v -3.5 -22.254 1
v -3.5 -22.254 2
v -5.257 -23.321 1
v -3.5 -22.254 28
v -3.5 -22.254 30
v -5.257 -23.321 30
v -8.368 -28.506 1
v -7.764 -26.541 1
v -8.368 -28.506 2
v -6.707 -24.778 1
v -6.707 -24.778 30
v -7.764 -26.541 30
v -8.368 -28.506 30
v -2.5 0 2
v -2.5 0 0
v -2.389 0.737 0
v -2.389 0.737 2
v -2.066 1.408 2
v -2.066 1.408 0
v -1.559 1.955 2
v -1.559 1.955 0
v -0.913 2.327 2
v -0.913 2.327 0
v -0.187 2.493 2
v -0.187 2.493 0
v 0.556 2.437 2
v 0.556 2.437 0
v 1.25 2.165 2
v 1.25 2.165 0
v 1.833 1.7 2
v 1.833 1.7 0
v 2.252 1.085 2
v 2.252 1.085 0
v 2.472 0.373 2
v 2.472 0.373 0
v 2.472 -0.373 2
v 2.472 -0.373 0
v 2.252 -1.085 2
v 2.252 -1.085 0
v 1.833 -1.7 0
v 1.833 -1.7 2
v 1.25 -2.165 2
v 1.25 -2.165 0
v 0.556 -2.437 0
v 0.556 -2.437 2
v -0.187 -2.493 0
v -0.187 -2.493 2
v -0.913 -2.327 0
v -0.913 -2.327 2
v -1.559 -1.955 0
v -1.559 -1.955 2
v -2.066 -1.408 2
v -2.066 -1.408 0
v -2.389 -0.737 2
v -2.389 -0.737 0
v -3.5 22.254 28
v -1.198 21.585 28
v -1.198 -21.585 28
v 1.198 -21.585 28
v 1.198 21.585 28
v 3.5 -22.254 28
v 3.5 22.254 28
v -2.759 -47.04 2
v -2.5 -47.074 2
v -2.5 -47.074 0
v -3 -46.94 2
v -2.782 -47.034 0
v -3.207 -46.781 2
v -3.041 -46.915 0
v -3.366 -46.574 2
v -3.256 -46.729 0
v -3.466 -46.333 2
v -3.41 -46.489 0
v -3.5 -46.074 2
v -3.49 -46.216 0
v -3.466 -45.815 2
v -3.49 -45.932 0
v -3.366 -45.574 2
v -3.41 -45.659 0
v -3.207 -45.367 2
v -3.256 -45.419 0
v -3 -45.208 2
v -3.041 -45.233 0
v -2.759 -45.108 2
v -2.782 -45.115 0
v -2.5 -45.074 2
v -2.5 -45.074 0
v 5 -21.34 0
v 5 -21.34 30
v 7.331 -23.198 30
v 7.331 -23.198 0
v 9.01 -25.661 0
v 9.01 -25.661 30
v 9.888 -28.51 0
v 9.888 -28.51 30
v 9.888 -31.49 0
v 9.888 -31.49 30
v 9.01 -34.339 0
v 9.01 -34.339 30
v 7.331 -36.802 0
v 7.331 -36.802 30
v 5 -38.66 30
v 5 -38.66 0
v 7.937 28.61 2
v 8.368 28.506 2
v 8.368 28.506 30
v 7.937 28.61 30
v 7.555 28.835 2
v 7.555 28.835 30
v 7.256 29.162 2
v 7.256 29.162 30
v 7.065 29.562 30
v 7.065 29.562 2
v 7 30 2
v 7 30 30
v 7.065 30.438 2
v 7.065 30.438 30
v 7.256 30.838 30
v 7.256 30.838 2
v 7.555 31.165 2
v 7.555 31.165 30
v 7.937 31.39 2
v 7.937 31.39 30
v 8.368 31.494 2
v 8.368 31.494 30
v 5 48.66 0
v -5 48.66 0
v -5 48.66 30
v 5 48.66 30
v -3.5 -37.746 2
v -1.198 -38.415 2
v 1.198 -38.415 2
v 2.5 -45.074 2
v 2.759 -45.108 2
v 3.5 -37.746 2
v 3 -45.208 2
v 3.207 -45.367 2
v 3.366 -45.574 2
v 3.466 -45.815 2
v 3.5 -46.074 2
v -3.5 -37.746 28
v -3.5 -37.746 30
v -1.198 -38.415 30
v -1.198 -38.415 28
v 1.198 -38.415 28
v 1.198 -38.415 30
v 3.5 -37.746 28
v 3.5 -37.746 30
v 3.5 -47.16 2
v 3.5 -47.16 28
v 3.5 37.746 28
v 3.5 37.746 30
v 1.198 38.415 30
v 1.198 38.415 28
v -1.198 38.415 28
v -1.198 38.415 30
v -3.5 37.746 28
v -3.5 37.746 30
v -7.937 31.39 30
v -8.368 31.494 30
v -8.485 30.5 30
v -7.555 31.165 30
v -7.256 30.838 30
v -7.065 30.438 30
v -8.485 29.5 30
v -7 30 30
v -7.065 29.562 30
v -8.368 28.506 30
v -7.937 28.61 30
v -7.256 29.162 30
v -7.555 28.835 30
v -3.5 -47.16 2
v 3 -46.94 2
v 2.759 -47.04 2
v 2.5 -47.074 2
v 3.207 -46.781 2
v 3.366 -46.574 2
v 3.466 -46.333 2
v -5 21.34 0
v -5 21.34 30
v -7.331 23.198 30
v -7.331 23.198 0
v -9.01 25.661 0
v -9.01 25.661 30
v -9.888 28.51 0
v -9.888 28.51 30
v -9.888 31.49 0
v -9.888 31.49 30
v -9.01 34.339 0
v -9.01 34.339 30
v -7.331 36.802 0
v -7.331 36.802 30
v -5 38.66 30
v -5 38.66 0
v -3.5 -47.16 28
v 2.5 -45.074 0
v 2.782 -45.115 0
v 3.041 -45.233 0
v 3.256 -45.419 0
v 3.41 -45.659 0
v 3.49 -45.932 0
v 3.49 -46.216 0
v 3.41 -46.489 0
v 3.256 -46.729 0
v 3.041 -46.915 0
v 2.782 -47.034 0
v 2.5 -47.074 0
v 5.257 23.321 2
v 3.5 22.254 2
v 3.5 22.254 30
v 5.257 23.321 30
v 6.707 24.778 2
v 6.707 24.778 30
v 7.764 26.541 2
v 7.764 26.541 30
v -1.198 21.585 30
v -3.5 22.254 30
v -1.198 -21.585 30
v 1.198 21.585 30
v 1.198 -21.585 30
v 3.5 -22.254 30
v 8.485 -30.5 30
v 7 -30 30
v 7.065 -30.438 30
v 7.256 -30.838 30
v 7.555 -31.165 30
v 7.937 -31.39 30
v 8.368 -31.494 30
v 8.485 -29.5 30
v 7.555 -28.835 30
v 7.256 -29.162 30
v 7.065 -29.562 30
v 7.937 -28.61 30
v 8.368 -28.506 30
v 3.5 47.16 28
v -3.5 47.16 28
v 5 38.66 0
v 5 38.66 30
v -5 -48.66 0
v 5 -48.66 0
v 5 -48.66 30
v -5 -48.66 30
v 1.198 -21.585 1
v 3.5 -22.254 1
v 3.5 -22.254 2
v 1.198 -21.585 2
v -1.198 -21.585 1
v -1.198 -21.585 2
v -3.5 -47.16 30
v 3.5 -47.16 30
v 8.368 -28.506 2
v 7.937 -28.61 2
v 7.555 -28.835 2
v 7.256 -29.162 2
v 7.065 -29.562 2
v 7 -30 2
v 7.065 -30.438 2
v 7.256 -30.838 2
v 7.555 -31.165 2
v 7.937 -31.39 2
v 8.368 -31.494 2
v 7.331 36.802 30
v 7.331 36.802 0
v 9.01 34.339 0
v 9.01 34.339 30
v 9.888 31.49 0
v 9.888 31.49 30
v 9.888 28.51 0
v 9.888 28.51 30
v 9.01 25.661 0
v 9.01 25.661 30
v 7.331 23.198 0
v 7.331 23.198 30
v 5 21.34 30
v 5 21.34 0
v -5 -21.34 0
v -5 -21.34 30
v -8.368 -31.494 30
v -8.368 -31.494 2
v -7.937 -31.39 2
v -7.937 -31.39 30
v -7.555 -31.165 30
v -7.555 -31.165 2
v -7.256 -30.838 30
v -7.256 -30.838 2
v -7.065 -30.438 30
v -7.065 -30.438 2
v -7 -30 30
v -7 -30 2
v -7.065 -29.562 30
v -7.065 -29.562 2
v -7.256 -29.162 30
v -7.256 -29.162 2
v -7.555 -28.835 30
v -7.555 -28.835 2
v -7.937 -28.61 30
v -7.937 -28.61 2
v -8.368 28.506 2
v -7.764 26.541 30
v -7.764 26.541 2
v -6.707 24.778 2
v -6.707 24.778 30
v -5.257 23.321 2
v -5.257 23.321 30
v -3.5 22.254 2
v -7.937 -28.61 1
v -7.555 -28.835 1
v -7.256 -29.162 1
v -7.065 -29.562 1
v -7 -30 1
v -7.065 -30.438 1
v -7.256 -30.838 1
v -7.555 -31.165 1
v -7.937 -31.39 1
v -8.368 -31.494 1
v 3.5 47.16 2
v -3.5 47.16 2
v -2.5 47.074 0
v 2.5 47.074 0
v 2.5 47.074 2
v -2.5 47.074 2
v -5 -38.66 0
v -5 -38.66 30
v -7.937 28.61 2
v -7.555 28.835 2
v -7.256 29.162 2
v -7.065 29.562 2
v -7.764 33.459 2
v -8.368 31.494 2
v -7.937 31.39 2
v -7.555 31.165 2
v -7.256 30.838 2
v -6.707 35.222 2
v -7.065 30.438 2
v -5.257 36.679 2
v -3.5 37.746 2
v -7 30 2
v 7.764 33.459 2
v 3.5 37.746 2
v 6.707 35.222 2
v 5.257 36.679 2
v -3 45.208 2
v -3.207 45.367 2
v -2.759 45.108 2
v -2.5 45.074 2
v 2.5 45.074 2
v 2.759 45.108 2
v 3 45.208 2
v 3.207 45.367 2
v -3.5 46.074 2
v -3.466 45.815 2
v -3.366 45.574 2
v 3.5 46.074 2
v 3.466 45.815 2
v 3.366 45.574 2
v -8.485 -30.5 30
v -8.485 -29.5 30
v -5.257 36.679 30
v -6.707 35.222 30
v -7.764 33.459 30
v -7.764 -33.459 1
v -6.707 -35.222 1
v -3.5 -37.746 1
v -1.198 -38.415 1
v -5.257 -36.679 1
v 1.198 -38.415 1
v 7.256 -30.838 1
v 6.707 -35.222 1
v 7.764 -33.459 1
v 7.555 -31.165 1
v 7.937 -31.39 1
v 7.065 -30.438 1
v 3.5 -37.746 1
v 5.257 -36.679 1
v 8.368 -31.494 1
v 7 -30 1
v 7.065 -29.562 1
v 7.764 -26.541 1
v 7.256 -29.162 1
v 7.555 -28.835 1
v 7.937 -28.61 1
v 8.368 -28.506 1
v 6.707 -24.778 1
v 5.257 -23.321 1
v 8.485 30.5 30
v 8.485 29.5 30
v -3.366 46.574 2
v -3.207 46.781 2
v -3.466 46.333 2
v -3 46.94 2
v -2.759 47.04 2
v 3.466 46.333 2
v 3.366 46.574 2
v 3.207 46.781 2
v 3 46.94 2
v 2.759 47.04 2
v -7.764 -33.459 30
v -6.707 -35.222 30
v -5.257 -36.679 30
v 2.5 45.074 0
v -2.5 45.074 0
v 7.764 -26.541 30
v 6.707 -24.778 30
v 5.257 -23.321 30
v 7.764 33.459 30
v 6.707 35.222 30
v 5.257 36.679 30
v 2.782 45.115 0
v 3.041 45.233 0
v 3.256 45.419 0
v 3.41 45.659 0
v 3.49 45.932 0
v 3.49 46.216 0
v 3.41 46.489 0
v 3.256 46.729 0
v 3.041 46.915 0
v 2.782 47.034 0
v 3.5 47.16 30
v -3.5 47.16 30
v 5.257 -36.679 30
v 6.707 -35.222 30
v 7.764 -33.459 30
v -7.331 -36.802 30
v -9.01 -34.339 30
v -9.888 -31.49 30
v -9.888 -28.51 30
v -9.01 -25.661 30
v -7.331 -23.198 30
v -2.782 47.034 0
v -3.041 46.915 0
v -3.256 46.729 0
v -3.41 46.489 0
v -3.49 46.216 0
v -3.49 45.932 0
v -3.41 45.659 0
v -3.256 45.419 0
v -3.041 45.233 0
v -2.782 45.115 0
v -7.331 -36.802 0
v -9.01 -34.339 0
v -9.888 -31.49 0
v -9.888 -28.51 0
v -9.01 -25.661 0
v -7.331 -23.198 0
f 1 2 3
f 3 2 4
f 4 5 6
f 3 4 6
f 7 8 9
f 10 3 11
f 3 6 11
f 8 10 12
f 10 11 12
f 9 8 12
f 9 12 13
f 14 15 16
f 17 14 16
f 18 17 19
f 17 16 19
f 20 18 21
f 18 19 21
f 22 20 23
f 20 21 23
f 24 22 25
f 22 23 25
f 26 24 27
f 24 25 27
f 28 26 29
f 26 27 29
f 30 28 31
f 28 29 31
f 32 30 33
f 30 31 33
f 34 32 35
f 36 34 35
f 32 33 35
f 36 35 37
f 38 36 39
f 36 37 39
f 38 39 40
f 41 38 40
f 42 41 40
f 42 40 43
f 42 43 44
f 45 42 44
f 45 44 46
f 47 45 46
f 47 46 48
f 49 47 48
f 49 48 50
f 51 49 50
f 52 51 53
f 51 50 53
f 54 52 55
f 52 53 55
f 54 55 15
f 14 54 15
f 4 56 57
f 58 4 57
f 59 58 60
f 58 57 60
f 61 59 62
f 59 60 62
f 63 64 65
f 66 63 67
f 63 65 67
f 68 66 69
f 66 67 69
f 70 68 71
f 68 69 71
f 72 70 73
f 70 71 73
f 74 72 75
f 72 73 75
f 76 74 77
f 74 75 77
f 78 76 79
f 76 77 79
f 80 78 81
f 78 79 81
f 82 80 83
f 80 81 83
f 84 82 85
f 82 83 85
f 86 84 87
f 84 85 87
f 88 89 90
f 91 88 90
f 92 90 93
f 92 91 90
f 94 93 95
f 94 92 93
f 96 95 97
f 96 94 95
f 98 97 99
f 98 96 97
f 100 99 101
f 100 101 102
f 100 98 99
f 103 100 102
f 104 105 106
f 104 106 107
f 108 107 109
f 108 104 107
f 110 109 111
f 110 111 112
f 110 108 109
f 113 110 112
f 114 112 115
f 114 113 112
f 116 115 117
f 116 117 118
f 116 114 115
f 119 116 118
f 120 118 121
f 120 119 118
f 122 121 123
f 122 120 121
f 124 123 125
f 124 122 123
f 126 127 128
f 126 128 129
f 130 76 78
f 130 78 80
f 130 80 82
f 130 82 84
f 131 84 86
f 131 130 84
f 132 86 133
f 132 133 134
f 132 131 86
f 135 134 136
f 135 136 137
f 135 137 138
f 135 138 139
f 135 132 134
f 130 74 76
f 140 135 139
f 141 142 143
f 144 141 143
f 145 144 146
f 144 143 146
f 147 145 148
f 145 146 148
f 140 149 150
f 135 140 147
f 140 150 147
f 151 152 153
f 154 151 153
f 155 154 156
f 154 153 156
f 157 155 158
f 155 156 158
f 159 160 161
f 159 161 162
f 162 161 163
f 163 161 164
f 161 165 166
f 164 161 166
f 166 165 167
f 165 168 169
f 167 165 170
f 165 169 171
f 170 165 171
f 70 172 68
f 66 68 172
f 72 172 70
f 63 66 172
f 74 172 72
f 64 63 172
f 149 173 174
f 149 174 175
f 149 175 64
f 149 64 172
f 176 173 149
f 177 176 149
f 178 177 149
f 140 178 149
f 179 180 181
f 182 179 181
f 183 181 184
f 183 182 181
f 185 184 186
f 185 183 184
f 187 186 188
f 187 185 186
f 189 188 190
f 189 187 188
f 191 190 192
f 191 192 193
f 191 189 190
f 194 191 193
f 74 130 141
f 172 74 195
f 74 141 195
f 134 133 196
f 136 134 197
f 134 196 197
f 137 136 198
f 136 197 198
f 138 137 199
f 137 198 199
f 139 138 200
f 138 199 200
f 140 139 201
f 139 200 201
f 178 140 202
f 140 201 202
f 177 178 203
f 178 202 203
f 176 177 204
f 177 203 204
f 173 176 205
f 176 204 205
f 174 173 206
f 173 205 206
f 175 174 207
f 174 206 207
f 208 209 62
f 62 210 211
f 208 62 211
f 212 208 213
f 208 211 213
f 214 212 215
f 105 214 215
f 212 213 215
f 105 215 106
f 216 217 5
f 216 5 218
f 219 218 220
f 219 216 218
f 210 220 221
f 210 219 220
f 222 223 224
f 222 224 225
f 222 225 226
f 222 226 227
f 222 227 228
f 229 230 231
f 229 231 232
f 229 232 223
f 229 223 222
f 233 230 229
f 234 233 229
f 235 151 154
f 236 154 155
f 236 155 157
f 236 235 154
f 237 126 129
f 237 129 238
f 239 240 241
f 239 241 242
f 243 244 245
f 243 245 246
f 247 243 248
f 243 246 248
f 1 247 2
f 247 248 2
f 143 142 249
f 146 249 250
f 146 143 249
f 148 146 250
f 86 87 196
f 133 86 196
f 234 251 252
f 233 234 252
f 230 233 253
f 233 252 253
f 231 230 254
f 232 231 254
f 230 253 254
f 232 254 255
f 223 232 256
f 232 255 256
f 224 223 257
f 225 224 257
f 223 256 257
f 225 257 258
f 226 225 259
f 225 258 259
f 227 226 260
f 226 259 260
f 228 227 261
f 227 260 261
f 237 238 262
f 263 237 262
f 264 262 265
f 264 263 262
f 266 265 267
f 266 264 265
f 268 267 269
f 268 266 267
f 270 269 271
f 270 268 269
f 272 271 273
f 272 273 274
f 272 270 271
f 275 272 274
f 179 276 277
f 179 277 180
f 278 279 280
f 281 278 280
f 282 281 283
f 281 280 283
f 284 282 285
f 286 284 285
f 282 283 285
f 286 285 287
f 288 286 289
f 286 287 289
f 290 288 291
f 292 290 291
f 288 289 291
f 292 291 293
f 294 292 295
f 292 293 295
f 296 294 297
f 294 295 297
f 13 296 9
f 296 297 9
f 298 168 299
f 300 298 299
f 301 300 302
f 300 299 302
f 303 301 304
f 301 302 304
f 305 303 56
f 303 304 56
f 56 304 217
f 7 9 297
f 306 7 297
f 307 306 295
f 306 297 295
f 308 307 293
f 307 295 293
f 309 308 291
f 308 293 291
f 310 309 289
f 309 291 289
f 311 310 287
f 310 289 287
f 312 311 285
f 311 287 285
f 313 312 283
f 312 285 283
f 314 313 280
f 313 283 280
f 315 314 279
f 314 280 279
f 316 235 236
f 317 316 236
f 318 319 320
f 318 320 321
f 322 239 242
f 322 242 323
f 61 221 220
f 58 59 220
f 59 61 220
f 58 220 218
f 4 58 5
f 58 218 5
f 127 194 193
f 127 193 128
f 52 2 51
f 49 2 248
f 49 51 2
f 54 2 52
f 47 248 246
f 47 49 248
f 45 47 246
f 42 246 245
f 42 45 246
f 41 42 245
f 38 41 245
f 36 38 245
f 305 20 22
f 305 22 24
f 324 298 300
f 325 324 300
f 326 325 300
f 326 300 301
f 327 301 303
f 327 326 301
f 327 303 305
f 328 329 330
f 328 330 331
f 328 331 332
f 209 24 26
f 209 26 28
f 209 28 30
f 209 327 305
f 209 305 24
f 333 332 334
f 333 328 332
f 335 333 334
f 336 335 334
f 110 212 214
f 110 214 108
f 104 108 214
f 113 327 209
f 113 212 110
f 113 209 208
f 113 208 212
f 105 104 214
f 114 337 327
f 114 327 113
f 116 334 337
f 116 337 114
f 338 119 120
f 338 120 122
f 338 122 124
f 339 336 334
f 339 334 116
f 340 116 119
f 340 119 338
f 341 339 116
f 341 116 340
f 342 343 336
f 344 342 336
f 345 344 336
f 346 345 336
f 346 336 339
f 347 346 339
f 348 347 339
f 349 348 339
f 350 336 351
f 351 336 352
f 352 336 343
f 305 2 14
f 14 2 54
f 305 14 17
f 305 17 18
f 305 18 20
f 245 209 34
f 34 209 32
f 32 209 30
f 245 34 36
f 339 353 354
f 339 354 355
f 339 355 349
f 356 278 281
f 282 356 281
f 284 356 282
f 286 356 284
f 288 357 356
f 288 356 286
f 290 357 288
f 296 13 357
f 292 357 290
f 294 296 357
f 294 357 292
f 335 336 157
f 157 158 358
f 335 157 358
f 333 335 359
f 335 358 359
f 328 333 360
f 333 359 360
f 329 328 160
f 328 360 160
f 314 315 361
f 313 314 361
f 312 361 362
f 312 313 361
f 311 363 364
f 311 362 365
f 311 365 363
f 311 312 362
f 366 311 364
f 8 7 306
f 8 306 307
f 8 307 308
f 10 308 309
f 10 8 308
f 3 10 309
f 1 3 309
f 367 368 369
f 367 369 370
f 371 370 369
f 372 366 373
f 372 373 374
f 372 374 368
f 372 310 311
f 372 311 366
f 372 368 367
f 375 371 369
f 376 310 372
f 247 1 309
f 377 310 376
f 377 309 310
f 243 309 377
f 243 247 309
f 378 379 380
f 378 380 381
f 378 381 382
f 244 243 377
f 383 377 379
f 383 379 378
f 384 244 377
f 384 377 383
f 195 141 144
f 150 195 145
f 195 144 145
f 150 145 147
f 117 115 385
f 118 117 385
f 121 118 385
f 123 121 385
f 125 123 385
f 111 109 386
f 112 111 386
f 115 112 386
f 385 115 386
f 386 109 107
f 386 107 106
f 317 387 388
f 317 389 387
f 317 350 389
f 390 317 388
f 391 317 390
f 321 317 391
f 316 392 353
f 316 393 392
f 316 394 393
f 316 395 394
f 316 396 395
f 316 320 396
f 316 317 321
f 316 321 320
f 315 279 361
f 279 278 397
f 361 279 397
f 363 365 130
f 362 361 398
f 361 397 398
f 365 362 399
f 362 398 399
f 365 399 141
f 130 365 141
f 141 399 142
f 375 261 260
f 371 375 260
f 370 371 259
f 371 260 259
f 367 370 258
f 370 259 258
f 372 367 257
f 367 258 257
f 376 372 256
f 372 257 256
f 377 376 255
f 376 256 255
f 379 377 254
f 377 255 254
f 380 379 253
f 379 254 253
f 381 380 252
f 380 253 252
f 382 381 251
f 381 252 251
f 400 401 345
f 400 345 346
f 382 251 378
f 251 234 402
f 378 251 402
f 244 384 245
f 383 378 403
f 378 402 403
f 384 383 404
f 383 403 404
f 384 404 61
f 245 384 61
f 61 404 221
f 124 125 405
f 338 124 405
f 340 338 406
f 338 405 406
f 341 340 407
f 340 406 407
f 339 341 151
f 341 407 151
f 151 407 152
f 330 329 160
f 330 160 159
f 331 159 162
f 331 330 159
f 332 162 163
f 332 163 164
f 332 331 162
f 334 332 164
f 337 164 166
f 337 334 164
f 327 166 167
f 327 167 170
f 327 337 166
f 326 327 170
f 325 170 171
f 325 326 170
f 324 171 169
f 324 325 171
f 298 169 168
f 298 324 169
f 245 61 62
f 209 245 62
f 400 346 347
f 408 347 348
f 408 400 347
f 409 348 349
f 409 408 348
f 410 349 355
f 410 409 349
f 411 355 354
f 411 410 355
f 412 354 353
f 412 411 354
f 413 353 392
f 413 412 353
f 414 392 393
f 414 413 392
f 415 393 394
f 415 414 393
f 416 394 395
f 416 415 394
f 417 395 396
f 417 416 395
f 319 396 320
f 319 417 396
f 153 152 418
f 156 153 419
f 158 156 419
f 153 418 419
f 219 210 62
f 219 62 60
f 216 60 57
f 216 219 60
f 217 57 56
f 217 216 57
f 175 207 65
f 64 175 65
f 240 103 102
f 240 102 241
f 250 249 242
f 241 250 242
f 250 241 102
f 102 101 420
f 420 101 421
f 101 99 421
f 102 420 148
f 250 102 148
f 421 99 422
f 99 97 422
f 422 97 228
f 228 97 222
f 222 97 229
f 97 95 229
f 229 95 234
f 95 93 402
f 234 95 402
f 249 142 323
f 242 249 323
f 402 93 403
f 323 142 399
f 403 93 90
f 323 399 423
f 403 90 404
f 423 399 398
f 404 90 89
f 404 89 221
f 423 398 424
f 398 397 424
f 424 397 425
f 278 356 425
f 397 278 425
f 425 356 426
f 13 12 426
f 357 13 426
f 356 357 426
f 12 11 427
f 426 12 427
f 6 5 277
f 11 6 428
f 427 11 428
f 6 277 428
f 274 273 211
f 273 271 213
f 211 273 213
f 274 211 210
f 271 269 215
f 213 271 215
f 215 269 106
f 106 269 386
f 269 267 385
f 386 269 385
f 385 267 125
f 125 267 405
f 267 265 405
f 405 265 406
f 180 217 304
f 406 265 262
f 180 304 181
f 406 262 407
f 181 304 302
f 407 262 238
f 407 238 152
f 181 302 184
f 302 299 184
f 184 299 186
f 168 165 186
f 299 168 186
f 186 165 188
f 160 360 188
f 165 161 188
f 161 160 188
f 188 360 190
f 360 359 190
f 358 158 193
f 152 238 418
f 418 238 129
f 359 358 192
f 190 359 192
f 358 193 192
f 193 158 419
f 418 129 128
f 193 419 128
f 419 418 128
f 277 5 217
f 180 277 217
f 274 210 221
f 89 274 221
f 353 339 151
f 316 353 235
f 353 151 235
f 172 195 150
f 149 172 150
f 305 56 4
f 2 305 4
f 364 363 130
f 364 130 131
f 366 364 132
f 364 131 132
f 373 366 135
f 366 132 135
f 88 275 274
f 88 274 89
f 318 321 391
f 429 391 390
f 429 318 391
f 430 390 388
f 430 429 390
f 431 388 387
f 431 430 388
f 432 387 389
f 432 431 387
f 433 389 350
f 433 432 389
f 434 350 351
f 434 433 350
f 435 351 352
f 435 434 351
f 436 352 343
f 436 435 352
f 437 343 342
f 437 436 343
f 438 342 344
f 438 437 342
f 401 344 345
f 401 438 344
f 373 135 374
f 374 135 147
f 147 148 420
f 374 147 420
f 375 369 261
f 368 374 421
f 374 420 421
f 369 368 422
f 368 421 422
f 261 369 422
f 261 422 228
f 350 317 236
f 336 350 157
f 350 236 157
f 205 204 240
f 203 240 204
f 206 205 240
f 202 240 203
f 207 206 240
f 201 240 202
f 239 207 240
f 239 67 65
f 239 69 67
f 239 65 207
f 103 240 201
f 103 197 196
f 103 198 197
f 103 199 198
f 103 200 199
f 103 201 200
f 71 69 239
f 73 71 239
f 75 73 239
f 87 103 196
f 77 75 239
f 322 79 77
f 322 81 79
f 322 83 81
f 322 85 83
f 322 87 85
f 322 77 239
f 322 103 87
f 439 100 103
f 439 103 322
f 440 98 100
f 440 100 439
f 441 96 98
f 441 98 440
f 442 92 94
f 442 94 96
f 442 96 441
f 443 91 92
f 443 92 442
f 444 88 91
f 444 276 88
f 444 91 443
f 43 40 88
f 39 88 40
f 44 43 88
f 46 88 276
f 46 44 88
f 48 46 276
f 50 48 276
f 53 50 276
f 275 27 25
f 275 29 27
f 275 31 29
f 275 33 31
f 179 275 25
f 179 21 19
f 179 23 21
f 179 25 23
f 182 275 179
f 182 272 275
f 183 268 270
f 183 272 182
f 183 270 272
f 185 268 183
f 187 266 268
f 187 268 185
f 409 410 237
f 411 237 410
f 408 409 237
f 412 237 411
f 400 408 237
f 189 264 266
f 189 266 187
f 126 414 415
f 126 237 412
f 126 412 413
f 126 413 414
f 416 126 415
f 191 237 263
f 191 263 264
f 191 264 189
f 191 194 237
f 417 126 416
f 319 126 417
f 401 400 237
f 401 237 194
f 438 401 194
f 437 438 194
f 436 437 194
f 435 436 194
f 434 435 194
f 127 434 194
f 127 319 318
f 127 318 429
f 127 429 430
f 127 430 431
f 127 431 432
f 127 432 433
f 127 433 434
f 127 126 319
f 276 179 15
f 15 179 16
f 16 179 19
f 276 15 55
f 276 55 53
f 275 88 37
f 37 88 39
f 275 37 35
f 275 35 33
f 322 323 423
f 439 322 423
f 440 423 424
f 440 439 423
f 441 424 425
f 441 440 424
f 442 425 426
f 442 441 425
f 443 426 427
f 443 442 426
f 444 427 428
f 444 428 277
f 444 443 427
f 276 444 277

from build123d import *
from build123d.topology import SkipClean

# Parameters (mm, degrees)
BOSS_EXTRU_1_DEPTH      = 30
ENL_V_MAT_EXTRU_1_DEPTH = 28
BOSS_EXTRU_2_DEPTH      = 2
ESQUISSE5_R             = 2.5
ENL_V_MAT_EXTRU_2_DEPTH = 2
BOSS_EXTRU_3_DEPTH      = 29
ENL_V_MAT_EXTRU_4_DEPTH = 29
BOSS_EXTRU_4_DEPTH      = 28


with BuildPart() as part:
    # Esquisse1 → Boss.-Extru.1 (new body)
    with BuildSketch(Plane.XY):
        with BuildLine():
            Line((-5, -21.339745962), (-5, 21.339745962))
            ThreePointArc((-5, 21.339745962), (-10, 30), (-5, 38.660254038))
            Line((-5, 38.660254038), (-5, 48.660254038))
            Line((-5, 48.660254038), (5, 48.660254038))
            Line((5, 48.660254038), (5, 38.660254038))
            ThreePointArc((5, 38.660254038), (10, 30), (5, 21.339745962))
            Line((5, 21.339745962), (5, -21.339745962))
            ThreePointArc((5, -21.339745962), (10, -30), (5, -38.660254038))
            Line((5, -38.660254038), (5, -48.660254038))
            Line((5, -48.660254038), (-5, -48.660254038))
            Line((-5, -48.660254038), (-5, -38.660254038))
            ThreePointArc((-5, -38.660254038), (-10, -30), (-5, -21.339745962))
        make_face()
    extrude(amount=BOSS_EXTRU_1_DEPTH)

    # Esquisse2 → Enl_v. mat.-Extru.1 (cut)
    with BuildSketch(Plane.XY.offset(30)):
        with BuildLine():
            Line((-3.5, 22.254033308), (-3.5, -22.254033308))
            ThreePointArc((-3.5, -22.254033308), (-8.5, -30), (-3.5, -37.745966692))
            Line((-3.5, -37.745966692), (-3.5, -47.160254038))
            Line((-3.5, -47.160254038), (3.5, -47.160254038))
            Line((3.5, -47.160254038), (3.5, -37.745966692))
            ThreePointArc((3.5, -37.745966692), (8.5, -30), (3.5, -22.254033308))
            Line((3.5, -22.254033308), (3.5, 22.254033308))
            ThreePointArc((3.5, 22.254033308), (8.5, 30), (3.5, 37.745966692))
            Line((3.5, 37.745966692), (3.5, 47.160254038))
            Line((3.5, 47.160254038), (-3.5, 47.160254038))
            Line((-3.5, 47.160254038), (-3.5, 37.745966692))
            ThreePointArc((-3.5, 37.745966692), (-8.5, 30), (-3.5, 22.254033308))
        make_face()
    extrude(amount=-ENL_V_MAT_EXTRU_1_DEPTH, mode=Mode.SUBTRACT)

    # Esquisse3 → Boss.-Extru.2 (add)
    with SkipClean():  # keep this step's faces unmerged: merging them makes the solid invalid here
        with BuildSketch(Plane.XY.offset(30)):
            with BuildLine():
                Line((-3.5, 37.745966692), (-3.5, 47.160254038))
                Line((-3.5, 47.160254038), (3.5, 47.160254038))
                Line((3.5, 47.160254038), (3.5, 37.745966692))
                ThreePointArc((3.5, 37.745966692), (0, 38.5), (-3.5, 37.745966692))
            make_face()
            with BuildLine():
                Line((-3.5, -37.745966692), (-3.5, -47.160254038))
                Line((-3.5, -47.160254038), (3.5, -47.160254038))
                Line((3.5, -47.160254038), (3.5, -37.745966692))
                ThreePointArc((3.5, -37.745966692), (0, -38.5), (-3.5, -37.745966692))
            make_face()
            with BuildLine():
                Line((3.5, -22.254033308), (3.5, 22.254033308))
                ThreePointArc((3.5, 22.254033308), (0, 21.5), (-3.5, 22.254033308))
                Line((-3.5, 22.254033308), (-3.5, -22.254033308))
                ThreePointArc((-3.5, -22.254033308), (0, -21.5), (3.5, -22.254033308))
            make_face()
        extrude(amount=-BOSS_EXTRU_2_DEPTH)

    # Esquisse5 → Enl_v. mat.-Extru.2 (cut)
    with SkipClean():  # keep this step's faces unmerged: merging them makes the solid invalid here
        with BuildSketch(Plane(origin=(0, 0, 0), x_dir=(-1, 0, 0), z_dir=(0, 0, -1))):
            Circle(ESQUISSE5_R)
            with BuildLine():
                Line((2.5, 45.074057395), (-2.5, 45.074057395))
                ThreePointArc((-2.5, 45.074057395), (-3.5, 46.074057395), (-2.5, 47.074057395))
                Line((-2.5, 47.074057395), (2.5, 47.074057395))
                ThreePointArc((2.5, 47.074057395), (3.5, 46.074057395), (2.5, 45.074057395))
            make_face()
            with BuildLine():
                Line((2.5, -45.074057395), (-2.5, -45.074057395))
                ThreePointArc((-2.5, -45.074057395), (-3.5, -46.074057395), (-2.5, -47.074057395))
                Line((-2.5, -47.074057395), (2.5, -47.074057395))
                ThreePointArc((2.5, -47.074057395), (3.5, -46.074057395), (2.5, -45.074057395))
            make_face()
        extrude(amount=-ENL_V_MAT_EXTRU_2_DEPTH, mode=Mode.SUBTRACT)

    # Esquisse8 → Boss.-Extru.3 (add)
    with SkipClean():  # keep this step's faces unmerged: merging them makes the solid invalid here
        with BuildSketch(Plane.XY.offset(30)):
            with BuildLine():
                ThreePointArc((8.367647059, -28.50585051), (7, -30), (8.367647059, -31.49414949))
                ThreePointArc((8.367647059, -31.49414949), (0, -38.5), (-8.367647059, -31.49414949))
                ThreePointArc((-8.367647059, -31.49414949), (-7, -30), (-8.367647059, -28.50585051))
                ThreePointArc((-8.367647059, -28.50585051), (0, -21.5), (8.367647059, -28.50585051))
            make_face()
        extrude(amount=-BOSS_EXTRU_3_DEPTH)

    # Esquisse8_15 → Enl_v. mat.-Extru.4 (cut)
    with SkipClean():  # keep this step's faces unmerged: merging them makes the solid invalid here
        with BuildSketch(Plane.XY.offset(30)):
            with BuildLine():
                ThreePointArc((-3.5, -37.745966692), (0, -38.5), (3.5, -37.745966692))
                ThreePointArc((3.5, -37.745966692), (6.706829822, -35.221918588), (8.367647059, -31.49414949))
                ThreePointArc((8.367647059, -31.49414949), (7, -30), (8.367647059, -28.50585051))
                ThreePointArc((8.367647059, -28.50585051), (6.706829822, -24.778081412), (3.5, -22.254033308))
                ThreePointArc((3.5, -22.254033308), (0, -21.5), (-3.5, -22.254033308))
                ThreePointArc((-3.5, -22.254033308), (-6.706829822, -24.778081412), (-8.367647059, -28.50585051))
                ThreePointArc((-8.367647059, -28.50585051), (-7, -30), (-8.367647059, -31.49414949))
                ThreePointArc((-8.367647059, -31.49414949), (-6.706829822, -35.221918588), (-3.5, -37.745966692))
            make_face()
        extrude(amount=-ENL_V_MAT_EXTRU_4_DEPTH, mode=Mode.SUBTRACT)

    # Esquisse12 → Boss.-Extru.4 (add)
    with SkipClean():  # keep this step's faces unmerged: merging them makes the solid invalid here
        with BuildSketch(Plane.XY.offset(2)):
            with BuildLine():
                ThreePointArc((8.367647059, -31.49414949), (8.5, -30), (8.367647059, -28.50585051))
                ThreePointArc((8.367647059, -28.50585051), (7, -30), (8.367647059, -31.49414949))
            make_face()
            with BuildLine():
                ThreePointArc((-8.367647059, -31.49414949), (-7, -30), (-8.367647059, -28.50585051))
                ThreePointArc((-8.367647059, -28.50585051), (-8.5, -30), (-8.367647059, -31.49414949))
            make_face()
        boss_extru_4 = extrude(amount=BOSS_EXTRU_4_DEPTH)

    # Sym_trie1: Boss.-Extru.4 across plane
    with SkipClean():  # keep this step's faces unmerged: merging them makes the solid invalid here
        add(boss_extru_4.mirror(Plane.ZX))


solid = part.part
